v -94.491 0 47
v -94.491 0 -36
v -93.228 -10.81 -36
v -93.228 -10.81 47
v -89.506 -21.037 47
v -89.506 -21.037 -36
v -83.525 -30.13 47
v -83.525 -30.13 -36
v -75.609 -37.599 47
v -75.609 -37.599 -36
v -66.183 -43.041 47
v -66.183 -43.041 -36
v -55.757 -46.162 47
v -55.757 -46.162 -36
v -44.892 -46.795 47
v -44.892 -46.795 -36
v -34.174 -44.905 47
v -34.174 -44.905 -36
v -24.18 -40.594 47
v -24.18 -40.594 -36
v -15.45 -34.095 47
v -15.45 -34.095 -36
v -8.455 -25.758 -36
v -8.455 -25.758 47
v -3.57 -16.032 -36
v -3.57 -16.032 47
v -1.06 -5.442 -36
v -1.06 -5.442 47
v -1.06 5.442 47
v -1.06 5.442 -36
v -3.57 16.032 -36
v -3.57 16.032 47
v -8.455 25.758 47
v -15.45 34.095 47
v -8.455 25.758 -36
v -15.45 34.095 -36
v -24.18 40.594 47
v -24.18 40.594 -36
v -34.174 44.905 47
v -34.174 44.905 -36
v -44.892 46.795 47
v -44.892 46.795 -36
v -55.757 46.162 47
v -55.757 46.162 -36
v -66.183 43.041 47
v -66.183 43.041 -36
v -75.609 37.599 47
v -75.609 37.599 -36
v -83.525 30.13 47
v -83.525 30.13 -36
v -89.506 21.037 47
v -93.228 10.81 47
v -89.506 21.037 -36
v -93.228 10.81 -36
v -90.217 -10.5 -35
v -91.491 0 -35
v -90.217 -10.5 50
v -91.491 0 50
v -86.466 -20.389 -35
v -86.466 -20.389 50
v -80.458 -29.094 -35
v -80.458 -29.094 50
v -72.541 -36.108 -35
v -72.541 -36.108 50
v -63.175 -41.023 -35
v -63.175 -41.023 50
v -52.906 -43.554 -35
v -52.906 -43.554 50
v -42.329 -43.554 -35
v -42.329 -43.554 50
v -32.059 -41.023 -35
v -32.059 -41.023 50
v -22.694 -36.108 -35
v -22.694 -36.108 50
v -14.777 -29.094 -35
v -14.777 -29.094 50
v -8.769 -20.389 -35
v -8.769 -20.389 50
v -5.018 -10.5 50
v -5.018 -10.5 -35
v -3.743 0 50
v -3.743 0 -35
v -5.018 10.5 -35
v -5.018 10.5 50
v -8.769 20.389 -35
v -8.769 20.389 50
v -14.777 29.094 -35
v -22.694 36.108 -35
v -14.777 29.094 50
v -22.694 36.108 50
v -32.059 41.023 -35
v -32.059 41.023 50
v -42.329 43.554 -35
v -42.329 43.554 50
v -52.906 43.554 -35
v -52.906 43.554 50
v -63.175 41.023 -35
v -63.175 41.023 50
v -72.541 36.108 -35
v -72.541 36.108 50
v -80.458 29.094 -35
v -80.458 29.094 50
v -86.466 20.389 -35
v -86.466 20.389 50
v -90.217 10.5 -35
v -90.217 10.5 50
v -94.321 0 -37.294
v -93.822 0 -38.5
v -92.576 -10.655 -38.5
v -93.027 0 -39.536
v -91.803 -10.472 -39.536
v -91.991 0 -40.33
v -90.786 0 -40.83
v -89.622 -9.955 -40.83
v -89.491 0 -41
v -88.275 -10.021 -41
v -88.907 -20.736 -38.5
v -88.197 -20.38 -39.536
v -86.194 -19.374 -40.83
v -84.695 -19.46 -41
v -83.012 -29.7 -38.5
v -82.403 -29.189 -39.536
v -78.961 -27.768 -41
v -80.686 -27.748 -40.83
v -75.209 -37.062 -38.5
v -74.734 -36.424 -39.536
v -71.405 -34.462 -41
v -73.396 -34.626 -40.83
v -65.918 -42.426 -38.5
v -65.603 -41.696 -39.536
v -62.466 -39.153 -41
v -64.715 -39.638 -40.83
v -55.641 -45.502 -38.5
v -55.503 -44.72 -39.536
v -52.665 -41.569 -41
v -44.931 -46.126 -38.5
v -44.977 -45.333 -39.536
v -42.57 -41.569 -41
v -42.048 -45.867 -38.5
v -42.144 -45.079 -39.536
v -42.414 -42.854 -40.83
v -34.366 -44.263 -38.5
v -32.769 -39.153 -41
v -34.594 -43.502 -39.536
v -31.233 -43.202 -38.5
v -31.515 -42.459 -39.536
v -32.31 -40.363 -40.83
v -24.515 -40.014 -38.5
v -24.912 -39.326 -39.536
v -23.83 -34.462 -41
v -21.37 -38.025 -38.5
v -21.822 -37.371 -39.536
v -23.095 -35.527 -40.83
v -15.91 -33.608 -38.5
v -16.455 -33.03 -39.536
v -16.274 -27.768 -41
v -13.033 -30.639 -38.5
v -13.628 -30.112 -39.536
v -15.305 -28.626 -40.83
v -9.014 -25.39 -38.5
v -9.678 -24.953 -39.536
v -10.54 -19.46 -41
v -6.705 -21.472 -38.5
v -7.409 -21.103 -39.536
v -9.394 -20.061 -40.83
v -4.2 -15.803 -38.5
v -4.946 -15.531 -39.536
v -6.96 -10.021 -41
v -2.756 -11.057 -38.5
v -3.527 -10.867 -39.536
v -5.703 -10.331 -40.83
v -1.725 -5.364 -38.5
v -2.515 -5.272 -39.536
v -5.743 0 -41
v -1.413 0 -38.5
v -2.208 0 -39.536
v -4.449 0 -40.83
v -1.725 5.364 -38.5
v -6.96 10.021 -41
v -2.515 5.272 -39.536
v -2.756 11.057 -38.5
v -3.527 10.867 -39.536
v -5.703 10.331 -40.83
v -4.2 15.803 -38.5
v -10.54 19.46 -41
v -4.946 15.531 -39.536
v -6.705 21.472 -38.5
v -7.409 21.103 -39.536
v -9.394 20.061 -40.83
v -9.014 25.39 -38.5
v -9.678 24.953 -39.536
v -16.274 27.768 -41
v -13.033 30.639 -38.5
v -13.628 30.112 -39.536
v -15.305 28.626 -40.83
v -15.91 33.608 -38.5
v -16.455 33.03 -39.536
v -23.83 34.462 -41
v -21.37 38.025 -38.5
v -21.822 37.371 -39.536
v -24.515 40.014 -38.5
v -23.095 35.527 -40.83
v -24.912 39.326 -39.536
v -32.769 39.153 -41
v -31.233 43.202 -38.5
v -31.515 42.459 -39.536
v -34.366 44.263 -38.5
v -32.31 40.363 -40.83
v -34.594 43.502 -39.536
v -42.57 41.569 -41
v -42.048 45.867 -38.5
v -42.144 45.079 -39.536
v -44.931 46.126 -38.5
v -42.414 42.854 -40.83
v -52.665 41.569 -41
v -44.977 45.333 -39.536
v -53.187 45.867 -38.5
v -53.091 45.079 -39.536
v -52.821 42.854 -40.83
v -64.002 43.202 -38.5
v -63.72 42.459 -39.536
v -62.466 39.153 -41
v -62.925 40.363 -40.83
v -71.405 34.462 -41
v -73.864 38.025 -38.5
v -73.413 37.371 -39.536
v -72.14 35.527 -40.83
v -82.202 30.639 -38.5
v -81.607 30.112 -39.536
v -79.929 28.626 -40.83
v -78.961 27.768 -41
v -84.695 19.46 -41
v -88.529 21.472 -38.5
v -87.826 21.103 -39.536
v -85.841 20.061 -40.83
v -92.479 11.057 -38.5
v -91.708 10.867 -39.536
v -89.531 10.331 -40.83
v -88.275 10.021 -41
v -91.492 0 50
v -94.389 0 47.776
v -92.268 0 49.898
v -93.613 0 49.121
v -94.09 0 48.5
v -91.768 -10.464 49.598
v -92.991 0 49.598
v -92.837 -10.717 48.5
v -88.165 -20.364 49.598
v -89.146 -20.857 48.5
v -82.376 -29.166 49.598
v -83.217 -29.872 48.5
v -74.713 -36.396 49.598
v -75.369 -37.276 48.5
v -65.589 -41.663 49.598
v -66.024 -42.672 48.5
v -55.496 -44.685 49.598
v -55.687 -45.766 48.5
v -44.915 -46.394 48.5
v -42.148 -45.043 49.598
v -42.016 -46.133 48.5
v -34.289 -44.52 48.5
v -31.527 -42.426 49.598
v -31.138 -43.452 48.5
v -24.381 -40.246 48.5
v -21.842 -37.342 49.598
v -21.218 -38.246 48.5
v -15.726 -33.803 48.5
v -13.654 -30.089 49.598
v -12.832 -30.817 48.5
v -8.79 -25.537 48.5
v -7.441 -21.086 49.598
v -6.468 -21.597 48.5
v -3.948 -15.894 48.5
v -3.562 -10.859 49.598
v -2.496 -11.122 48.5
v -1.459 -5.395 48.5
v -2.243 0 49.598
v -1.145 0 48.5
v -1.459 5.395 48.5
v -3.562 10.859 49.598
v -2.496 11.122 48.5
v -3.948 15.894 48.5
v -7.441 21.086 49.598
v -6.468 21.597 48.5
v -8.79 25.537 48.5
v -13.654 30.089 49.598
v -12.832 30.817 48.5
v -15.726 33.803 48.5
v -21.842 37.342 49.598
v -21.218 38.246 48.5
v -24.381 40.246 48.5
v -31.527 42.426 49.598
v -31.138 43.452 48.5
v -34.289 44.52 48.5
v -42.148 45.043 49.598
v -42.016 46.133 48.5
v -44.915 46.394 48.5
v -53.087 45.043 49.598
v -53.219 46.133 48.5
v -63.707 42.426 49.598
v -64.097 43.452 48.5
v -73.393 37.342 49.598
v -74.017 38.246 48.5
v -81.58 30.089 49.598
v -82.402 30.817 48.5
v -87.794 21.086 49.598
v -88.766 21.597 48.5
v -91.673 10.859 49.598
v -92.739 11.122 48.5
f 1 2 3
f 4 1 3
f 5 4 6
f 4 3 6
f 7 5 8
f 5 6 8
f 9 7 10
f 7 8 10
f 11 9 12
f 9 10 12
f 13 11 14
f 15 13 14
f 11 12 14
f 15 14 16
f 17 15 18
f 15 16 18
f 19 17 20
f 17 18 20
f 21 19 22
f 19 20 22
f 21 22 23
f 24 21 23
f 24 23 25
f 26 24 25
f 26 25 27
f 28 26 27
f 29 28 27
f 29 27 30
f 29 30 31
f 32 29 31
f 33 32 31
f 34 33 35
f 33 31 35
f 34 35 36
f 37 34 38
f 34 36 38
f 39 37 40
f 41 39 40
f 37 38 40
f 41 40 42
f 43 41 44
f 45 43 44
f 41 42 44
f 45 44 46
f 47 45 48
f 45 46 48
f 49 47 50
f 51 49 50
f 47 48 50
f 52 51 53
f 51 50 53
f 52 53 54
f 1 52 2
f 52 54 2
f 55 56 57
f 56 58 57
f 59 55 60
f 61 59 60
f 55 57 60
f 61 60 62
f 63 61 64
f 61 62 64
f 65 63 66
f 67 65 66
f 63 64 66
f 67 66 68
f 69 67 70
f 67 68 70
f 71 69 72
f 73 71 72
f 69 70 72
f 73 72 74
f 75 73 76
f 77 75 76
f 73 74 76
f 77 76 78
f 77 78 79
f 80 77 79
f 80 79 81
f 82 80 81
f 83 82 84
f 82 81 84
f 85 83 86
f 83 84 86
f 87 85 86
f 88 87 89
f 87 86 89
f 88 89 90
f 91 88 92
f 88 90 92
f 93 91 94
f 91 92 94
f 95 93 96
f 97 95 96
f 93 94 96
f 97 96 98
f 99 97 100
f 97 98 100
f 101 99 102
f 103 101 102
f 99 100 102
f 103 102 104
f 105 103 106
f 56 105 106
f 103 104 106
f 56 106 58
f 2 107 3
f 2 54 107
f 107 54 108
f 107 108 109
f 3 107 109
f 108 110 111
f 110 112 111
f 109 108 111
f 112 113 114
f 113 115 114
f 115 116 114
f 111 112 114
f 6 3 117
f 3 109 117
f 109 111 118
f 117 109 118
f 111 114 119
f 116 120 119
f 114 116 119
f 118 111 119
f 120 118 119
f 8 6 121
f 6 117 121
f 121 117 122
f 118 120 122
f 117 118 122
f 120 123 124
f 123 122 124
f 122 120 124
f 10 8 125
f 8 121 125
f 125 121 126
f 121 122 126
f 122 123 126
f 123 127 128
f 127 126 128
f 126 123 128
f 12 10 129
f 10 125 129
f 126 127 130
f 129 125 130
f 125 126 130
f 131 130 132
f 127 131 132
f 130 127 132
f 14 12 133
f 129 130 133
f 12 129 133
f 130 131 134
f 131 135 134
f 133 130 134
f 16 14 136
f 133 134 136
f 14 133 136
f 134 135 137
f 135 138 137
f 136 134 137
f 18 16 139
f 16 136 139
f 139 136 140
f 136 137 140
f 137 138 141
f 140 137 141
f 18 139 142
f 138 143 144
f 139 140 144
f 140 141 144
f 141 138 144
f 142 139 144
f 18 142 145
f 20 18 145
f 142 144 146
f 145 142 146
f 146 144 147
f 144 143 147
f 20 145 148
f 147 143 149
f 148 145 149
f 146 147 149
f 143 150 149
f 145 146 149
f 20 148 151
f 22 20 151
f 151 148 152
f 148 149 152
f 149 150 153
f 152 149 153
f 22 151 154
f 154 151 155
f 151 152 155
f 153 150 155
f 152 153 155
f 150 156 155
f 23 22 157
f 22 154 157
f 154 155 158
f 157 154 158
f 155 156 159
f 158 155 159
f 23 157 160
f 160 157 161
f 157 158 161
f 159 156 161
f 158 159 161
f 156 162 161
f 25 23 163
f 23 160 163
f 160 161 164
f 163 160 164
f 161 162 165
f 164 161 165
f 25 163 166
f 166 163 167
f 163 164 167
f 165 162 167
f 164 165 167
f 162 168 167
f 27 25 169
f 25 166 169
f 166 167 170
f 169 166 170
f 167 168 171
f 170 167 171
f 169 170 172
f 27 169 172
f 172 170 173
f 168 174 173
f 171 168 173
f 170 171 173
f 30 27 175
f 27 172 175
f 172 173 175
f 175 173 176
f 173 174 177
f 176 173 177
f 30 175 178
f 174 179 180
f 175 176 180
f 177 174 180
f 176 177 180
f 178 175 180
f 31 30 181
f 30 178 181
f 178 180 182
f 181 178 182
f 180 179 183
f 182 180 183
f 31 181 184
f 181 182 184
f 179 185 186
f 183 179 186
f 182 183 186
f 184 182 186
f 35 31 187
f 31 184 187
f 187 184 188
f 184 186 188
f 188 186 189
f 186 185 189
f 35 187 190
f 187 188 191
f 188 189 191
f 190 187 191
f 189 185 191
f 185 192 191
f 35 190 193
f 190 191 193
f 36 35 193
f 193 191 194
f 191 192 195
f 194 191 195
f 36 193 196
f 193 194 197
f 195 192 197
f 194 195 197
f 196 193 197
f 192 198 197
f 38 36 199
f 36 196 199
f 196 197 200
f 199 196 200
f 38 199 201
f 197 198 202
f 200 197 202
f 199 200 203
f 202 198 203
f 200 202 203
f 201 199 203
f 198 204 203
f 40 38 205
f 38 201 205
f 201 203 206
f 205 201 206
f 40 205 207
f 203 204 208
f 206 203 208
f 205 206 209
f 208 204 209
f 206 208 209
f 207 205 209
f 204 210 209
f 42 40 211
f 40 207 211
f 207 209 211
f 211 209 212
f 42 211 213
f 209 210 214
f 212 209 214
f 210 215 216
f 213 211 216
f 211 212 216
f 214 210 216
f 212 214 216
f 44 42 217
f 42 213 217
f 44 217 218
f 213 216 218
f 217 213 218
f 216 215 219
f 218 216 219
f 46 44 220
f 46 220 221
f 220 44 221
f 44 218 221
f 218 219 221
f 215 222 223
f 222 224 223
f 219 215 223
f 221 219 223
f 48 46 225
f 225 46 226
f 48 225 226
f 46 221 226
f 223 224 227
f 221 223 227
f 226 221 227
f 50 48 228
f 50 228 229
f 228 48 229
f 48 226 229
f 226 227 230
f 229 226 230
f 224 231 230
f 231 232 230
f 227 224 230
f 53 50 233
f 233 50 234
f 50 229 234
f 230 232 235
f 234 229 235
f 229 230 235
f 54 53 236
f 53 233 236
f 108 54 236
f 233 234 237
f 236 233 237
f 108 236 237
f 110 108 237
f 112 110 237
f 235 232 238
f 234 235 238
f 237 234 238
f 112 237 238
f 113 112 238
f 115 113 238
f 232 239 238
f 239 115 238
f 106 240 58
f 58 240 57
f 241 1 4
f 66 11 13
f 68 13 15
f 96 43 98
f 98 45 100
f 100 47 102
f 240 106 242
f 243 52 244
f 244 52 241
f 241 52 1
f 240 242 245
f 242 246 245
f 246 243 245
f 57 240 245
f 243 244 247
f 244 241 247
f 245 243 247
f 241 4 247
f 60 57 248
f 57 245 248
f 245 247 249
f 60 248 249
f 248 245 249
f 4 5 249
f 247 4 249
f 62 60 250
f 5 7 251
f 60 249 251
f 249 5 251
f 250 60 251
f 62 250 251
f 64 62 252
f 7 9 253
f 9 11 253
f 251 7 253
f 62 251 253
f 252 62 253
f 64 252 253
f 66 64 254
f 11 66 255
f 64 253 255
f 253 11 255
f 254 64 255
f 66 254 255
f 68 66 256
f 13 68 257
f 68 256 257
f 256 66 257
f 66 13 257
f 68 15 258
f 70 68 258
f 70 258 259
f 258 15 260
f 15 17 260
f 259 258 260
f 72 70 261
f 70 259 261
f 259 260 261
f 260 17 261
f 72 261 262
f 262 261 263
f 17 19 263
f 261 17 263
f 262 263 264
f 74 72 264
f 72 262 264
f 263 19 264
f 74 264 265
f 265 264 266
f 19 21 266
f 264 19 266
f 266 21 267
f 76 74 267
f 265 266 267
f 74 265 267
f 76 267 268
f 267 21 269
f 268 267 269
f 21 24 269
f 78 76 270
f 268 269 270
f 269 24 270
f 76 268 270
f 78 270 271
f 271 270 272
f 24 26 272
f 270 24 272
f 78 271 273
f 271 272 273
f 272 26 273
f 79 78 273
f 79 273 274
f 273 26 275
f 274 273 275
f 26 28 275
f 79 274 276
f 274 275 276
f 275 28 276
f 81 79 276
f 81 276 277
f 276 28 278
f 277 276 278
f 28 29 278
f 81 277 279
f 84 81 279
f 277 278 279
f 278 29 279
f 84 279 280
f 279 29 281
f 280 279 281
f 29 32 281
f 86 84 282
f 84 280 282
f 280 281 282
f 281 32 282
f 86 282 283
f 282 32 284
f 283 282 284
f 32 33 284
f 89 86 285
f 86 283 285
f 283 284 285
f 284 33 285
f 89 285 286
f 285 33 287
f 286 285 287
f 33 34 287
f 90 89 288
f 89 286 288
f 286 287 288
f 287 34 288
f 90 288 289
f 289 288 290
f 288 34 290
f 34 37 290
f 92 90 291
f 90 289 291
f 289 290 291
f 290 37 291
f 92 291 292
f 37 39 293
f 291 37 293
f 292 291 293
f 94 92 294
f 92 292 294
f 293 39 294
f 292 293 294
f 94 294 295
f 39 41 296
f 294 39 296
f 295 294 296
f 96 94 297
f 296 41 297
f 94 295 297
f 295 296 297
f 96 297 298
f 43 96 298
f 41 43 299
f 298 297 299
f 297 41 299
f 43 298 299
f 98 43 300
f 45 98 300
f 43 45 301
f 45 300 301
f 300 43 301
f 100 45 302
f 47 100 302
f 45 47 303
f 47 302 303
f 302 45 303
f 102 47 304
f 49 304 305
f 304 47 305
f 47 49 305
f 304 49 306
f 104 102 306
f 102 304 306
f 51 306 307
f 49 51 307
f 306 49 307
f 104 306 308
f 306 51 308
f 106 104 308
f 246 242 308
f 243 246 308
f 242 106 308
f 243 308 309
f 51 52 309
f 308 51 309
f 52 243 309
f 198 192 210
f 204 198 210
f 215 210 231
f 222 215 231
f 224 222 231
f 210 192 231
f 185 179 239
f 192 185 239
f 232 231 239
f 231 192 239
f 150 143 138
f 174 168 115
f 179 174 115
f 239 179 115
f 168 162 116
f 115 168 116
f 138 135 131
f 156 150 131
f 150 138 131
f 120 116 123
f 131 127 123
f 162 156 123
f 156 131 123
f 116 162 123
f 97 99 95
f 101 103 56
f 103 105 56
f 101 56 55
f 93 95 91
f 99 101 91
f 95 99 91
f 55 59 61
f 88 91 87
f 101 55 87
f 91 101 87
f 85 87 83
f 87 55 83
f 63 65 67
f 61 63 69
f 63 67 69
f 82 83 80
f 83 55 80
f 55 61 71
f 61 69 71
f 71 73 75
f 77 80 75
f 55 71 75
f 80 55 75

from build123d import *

# Parameters (mm, degrees)
F2_R = 2.99999
F3_R = 5


# Not quite as in the source:
# - a fillet or chamfer is up to 0.001 mm smaller than in the source, because OpenCascade refuses the exact size


with BuildPart() as f1:
    # F0 (on Front) → F1 (revolve)
    with BuildSketch(Plane.XZ):
        Polygon((-91.4914906025, 49.9999961555), (-94.4914906025, 49.9999961555), (-94.4914906025, -41.0000038445), (-47.6173348725, -41.0000038445), (-47.6173348725, -35.0000038445), (-91.4914906025, -35.0000038445), align=None)
    revolve(axis=Axis((-47.6173348725, 0, -38.0000038445), (0, 0, 1)))

    # F2 (radius 3 in the source; OpenCascade refuses exactly that, so slightly less here)
    f2_edges = [f1.edges().sort_by_distance(p)[0] for p in [
        (-0.743179, 0, 49.999996),
    ]]
    fillet(f2_edges, radius=F2_R)

    # F3
    f3_edges = [f1.edges().sort_by_distance(p)[0] for p in [
        (-0.743179, 0, -41.000004),
    ]]
    fillet(f3_edges, radius=F3_R)


solid = f1.part
